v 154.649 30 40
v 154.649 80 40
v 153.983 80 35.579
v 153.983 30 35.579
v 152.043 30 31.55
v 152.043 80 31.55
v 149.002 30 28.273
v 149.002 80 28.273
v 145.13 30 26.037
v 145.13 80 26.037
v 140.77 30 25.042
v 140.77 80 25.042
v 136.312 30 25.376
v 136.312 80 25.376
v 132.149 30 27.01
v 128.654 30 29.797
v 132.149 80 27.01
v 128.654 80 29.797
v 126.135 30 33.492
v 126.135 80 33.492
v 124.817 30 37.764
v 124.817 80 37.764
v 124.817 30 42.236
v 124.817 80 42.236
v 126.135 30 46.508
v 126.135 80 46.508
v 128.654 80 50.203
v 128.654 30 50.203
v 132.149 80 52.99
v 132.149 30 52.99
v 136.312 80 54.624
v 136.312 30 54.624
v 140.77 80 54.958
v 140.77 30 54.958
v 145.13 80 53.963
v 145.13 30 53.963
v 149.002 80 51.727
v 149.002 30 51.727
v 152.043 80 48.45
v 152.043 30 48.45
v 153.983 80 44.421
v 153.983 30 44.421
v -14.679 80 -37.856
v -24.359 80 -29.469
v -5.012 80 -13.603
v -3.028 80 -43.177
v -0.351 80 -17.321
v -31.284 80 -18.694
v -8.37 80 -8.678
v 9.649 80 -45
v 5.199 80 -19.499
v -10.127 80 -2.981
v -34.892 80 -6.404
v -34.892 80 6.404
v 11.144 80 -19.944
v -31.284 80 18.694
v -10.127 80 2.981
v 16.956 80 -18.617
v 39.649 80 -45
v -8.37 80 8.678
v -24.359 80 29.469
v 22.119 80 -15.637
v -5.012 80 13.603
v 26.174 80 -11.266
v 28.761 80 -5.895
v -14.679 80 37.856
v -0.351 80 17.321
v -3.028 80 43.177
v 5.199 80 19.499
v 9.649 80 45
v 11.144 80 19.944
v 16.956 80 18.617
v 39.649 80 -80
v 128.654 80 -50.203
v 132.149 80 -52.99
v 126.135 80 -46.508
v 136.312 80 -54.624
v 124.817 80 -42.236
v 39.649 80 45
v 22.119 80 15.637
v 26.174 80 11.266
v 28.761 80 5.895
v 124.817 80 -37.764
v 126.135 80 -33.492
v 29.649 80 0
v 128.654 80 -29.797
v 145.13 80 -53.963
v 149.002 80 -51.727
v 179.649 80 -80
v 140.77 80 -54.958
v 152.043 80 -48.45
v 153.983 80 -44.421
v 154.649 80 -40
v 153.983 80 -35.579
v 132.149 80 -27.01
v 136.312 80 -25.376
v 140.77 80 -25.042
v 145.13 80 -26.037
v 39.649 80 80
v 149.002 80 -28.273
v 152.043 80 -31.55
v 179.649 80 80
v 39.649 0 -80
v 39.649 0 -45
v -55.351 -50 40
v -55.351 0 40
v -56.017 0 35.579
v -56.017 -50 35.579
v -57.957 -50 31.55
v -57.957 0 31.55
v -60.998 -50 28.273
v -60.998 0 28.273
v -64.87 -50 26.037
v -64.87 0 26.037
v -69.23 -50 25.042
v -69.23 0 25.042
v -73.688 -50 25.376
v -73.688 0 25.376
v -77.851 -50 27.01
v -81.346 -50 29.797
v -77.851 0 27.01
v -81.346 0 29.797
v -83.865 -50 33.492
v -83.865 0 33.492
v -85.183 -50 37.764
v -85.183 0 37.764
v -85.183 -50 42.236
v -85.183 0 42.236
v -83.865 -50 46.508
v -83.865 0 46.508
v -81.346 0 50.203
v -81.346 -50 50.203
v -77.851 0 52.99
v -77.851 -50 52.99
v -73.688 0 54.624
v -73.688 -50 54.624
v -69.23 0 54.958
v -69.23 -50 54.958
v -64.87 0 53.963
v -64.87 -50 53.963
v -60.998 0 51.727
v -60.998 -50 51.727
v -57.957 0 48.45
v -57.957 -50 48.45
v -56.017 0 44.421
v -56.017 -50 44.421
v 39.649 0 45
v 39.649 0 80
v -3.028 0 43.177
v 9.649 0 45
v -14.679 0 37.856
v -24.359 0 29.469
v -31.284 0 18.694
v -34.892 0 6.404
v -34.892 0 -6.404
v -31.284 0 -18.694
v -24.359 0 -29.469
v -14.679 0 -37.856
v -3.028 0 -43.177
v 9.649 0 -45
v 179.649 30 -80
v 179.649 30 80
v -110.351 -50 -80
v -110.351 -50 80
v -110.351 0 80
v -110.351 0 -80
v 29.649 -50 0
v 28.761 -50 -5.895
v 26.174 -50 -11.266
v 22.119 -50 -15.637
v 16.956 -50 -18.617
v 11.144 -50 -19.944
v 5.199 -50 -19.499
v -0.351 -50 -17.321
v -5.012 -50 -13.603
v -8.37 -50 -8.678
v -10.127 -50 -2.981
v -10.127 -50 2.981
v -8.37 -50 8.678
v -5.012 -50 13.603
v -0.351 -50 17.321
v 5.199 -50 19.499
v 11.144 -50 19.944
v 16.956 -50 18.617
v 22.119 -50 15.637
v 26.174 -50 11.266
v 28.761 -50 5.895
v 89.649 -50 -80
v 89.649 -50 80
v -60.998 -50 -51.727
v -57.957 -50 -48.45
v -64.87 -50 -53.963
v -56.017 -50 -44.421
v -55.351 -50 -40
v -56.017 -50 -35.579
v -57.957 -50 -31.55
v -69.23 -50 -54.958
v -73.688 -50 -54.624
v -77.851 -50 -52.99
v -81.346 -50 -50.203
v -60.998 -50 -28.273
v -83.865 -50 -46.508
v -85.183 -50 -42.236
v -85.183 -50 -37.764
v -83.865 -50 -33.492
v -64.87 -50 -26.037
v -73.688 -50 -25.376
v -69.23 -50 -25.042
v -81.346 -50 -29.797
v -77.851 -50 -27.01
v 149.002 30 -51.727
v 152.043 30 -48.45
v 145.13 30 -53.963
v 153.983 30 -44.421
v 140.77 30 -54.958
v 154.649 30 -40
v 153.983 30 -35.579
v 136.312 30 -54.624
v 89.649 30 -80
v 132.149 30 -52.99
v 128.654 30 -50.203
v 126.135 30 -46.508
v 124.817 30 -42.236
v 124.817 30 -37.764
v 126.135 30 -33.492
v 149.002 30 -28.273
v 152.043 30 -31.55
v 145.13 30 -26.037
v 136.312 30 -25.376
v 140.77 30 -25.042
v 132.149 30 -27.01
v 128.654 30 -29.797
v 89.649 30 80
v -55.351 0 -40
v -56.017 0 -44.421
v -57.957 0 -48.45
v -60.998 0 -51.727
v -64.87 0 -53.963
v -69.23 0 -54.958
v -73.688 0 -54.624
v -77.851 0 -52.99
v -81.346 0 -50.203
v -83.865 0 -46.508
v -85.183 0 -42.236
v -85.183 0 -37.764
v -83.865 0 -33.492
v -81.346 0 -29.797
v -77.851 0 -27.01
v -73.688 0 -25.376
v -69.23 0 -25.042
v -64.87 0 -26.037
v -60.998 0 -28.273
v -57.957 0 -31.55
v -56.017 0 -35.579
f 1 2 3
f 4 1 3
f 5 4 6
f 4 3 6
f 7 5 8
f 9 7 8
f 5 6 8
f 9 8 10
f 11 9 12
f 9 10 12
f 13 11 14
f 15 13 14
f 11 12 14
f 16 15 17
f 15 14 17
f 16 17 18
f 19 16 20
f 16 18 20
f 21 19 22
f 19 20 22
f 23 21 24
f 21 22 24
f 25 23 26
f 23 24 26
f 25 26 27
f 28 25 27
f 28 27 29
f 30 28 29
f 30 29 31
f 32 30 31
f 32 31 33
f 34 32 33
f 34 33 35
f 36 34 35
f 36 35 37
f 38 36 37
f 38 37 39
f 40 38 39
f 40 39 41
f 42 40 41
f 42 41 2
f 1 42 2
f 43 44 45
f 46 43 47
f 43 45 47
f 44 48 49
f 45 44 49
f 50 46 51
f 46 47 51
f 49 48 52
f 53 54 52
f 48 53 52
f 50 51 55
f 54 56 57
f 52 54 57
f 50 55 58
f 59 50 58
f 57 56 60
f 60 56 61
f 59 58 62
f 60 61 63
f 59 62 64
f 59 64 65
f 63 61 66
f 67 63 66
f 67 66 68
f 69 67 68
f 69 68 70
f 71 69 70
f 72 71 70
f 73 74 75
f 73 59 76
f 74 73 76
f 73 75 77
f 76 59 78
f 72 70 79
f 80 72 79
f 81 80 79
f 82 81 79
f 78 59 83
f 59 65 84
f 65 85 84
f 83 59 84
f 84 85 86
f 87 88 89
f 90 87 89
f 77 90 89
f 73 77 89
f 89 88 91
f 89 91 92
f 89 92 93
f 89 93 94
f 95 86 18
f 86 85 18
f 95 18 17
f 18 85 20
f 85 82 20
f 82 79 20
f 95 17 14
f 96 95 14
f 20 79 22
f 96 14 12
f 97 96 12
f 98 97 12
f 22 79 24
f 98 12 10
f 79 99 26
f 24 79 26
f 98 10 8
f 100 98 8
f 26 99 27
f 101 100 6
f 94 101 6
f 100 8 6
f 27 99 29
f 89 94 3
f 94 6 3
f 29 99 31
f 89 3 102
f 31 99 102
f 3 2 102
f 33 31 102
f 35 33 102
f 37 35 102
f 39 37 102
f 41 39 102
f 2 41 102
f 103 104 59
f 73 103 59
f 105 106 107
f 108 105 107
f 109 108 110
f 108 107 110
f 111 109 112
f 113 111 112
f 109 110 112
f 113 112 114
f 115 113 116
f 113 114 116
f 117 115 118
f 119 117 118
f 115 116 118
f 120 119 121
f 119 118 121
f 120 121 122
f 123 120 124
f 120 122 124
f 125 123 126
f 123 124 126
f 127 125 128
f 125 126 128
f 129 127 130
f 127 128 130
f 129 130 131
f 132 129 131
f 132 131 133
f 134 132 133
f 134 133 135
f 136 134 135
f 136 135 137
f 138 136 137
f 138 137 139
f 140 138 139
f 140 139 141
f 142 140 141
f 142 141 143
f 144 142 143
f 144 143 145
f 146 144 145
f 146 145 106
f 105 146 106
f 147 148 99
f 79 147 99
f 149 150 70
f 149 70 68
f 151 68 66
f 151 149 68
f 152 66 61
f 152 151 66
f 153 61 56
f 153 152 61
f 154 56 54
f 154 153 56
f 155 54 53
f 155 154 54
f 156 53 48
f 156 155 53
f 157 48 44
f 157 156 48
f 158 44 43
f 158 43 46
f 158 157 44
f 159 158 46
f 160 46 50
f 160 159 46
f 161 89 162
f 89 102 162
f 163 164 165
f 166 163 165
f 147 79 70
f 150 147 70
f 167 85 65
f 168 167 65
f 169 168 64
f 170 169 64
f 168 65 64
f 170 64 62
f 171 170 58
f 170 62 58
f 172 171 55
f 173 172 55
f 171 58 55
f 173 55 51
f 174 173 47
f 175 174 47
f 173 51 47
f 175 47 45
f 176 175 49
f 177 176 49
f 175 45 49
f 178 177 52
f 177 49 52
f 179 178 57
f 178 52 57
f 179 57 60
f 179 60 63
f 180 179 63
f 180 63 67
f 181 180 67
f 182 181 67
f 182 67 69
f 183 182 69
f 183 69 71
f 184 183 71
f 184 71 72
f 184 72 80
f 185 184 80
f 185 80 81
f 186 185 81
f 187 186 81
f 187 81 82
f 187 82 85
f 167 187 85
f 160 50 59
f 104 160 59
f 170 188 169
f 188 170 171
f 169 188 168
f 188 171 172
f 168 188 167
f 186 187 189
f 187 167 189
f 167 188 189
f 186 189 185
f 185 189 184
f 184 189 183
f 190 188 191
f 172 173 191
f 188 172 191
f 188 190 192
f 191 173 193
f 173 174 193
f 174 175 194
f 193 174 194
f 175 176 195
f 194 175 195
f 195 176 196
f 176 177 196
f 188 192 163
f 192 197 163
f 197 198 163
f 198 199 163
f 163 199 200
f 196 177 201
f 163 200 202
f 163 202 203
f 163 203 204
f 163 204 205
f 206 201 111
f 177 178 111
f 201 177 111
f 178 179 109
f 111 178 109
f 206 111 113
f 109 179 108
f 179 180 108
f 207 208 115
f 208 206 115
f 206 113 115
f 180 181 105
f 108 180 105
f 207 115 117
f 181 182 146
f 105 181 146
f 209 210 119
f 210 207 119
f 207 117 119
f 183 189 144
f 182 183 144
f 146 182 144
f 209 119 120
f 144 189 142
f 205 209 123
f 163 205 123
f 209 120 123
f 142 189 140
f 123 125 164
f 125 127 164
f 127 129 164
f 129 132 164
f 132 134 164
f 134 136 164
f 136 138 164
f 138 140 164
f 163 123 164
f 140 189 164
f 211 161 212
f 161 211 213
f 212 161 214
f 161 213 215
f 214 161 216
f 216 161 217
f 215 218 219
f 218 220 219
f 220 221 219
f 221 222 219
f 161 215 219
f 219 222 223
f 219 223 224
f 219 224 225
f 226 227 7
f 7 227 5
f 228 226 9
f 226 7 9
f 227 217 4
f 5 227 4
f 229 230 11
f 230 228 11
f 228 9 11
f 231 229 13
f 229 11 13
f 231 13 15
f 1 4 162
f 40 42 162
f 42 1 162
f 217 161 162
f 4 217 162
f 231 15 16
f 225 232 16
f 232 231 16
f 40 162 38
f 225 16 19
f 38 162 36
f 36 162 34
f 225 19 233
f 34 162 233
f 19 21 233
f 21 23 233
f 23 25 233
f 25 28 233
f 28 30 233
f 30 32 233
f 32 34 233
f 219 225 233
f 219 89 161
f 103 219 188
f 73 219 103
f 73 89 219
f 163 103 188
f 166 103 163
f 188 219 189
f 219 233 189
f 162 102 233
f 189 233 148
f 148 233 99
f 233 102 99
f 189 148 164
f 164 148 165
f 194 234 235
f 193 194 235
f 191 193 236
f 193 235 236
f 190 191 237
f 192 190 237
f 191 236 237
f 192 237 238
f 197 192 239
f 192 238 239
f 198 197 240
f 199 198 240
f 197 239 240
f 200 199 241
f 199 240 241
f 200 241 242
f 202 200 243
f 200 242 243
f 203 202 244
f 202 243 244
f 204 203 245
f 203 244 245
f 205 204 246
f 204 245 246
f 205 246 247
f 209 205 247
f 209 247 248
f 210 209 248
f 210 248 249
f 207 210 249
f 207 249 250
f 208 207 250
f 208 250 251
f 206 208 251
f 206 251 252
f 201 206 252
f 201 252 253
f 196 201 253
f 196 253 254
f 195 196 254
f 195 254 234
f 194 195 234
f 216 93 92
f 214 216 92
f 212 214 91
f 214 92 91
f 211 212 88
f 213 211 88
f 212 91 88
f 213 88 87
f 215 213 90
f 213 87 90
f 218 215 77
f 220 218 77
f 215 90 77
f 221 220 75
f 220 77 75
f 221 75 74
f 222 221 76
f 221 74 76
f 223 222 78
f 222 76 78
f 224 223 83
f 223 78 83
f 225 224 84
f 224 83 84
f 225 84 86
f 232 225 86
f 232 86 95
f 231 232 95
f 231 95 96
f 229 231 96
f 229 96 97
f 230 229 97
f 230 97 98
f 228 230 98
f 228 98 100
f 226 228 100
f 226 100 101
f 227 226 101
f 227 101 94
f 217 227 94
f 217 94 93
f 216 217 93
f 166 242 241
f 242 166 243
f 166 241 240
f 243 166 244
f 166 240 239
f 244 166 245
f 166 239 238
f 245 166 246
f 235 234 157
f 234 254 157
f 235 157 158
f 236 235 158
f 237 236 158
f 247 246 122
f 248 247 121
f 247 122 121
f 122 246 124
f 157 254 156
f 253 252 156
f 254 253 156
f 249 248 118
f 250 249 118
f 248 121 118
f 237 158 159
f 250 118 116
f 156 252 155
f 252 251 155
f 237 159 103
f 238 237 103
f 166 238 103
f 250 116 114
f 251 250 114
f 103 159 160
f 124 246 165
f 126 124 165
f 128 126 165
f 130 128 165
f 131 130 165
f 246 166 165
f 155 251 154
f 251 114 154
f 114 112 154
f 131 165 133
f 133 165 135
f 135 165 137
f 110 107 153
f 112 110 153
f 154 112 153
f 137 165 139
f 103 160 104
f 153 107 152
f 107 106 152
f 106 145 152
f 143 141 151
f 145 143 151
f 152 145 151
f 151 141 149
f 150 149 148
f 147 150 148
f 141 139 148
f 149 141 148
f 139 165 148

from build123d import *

# Parameters (mm, degrees)
RESSALTO_EXTRUS_O1_DEPTH = 80
RESSALTO_EXTRUS_O2_DEPTH = 80
ESBO_O3_R                = 15
ESBO_O3_R_2              = 20
CORTE_EXTRUS_O2_DEPTH    = 131


with BuildPart() as part:
    # Esboço1 → Ressalto-extrusão1 (new body, symmetric)
    with BuildSketch(Plane.XY):
        Polygon((-110.350506682, 0), (39.649493318, 0), (39.649493318, 80), (179.649493318, 80), (179.649493318, 30), (89.649493318, 30), (89.649493318, -50), (-110.350506682, -50), align=None)
    extrude(amount=RESSALTO_EXTRUS_O1_DEPTH, both=True)

    # Esboço2 → Ressalto-extrusão2 (add)
    with BuildSketch(Plane(origin=(0, 0, 0), x_dir=(1, 0, 0), z_dir=(0, 1, 0))):
        with BuildLine():
            Line((9.649493318, 45), (39.649493318, 45))
            Line((39.649493318, 45), (39.649493318, -45))
            Line((39.649493318, -45), (9.649493318, -45))
            ThreePointArc((9.649493318, -45), (-35.350506682, 0), (9.649493318, 45))
        make_face()
    extrude(amount=RESSALTO_EXTRUS_O2_DEPTH)

    # Esboço3 → Corte-extrusão2 (cut, through all)
    with BuildSketch(Plane(origin=(0, 80, 0), x_dir=(1, 0, 0), z_dir=(0, 1, 0))):
        with Locations((-70.350506682, 40)):
            Circle(ESBO_O3_R)
        with Locations((139.649493318, 40)):
            Circle(ESBO_O3_R)
        with Locations((139.649493318, -40)):
            Circle(ESBO_O3_R)
        with Locations((-70.350506682, -40)):
            Circle(ESBO_O3_R)
        with Locations((9.649493318, 0)):
            Circle(ESBO_O3_R_2)
    extrude(amount=-CORTE_EXTRUS_O2_DEPTH, mode=Mode.SUBTRACT)


solid = part.part
